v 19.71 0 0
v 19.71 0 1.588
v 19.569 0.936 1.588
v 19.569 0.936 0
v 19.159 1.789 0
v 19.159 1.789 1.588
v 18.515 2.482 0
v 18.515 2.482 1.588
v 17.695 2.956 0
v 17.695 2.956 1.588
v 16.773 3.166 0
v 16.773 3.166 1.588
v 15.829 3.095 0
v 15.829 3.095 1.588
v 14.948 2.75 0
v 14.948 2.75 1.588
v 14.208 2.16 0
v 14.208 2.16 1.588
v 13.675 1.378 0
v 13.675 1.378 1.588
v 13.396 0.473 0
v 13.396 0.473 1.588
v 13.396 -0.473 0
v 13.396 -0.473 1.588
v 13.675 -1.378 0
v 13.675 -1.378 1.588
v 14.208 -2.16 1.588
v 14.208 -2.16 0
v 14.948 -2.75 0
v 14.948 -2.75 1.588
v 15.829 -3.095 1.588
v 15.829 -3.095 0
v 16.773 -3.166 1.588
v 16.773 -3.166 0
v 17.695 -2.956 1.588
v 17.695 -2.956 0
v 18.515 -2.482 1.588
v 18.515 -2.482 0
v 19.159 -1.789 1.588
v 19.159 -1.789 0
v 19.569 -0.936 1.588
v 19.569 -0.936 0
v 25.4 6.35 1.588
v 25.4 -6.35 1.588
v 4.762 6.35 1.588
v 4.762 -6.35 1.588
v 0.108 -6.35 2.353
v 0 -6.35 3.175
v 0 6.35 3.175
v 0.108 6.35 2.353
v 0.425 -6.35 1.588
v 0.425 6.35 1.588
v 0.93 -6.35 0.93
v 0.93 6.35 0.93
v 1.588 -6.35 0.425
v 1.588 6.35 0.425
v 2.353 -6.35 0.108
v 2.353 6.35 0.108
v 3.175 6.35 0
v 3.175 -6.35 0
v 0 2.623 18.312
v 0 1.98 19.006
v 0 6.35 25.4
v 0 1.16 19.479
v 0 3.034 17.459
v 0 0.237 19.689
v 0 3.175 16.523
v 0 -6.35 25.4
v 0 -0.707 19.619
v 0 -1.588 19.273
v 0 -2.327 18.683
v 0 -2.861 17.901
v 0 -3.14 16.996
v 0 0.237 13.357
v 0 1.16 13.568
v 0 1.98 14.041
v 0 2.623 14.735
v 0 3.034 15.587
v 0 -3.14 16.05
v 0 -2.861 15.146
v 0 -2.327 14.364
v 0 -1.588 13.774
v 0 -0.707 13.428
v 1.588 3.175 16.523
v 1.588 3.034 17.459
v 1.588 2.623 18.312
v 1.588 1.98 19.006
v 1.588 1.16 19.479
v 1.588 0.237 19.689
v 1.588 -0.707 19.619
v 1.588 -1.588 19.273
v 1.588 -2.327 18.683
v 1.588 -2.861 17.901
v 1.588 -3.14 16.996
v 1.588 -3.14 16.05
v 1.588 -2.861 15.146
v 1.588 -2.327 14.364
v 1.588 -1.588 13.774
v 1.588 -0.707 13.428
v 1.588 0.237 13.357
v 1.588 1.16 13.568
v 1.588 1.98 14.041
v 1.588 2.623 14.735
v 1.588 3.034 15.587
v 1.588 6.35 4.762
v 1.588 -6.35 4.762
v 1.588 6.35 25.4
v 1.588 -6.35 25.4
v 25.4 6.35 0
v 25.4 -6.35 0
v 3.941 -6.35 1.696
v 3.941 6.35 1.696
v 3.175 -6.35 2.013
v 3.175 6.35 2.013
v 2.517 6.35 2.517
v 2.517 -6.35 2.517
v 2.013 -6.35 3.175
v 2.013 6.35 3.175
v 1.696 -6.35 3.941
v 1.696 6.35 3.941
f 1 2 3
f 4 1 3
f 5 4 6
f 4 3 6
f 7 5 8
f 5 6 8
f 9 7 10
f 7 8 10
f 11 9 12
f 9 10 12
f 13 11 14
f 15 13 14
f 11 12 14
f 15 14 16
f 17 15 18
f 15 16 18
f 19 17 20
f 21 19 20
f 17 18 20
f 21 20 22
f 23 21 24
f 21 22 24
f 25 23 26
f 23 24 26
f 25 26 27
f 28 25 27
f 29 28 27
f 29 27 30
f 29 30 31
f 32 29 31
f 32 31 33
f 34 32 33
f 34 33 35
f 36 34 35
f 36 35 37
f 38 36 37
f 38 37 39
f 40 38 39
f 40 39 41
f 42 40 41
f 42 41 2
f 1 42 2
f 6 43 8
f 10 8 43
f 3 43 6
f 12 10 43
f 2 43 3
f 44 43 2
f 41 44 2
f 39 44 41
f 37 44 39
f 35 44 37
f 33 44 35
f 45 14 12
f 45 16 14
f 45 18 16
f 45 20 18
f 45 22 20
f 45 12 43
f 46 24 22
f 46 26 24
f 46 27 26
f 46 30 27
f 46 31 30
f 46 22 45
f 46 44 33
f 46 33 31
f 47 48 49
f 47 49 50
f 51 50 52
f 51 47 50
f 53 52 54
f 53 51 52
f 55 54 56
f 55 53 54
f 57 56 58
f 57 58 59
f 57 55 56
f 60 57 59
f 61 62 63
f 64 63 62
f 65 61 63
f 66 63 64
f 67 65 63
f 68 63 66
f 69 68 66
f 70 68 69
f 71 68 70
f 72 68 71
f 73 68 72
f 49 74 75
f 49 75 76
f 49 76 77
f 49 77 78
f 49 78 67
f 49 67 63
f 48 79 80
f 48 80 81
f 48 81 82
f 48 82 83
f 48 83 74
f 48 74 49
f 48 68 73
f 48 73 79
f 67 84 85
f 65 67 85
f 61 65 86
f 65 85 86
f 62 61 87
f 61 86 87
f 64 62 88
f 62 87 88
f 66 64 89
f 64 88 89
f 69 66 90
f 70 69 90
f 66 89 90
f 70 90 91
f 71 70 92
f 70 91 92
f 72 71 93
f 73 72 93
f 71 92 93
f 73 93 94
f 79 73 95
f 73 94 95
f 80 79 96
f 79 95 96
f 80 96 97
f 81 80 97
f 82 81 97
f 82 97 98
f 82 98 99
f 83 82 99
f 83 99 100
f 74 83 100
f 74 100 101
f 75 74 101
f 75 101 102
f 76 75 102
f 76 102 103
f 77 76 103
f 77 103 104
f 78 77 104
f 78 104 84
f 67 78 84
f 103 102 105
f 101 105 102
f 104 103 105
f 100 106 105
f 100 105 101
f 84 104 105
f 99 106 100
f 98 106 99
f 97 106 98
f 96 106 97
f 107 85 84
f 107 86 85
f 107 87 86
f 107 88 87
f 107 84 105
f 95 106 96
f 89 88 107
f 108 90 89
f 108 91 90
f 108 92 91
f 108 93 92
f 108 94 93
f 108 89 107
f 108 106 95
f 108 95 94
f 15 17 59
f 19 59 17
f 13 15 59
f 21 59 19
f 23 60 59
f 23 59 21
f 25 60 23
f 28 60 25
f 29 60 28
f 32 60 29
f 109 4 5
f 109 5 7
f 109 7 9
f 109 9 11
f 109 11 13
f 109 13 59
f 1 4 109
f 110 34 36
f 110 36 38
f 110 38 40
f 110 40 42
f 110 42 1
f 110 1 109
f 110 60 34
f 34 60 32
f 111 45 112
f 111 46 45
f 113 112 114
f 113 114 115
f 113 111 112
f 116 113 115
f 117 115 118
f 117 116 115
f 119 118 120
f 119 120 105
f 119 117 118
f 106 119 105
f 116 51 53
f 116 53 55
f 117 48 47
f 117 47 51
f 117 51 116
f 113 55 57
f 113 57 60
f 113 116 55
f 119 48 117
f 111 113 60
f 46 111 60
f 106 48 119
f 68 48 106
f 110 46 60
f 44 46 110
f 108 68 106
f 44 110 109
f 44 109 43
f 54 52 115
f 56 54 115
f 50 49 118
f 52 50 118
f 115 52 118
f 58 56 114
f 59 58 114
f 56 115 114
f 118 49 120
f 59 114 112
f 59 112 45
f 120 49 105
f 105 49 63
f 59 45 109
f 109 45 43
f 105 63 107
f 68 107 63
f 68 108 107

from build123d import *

# Parameters (mm, degrees)
F1_DEPTH = 6.35
F2_R     = 3.175
F3_DEPTH = 1.5885
F4_R     = 3.175
F5_DEPTH = 1.5885


with BuildPart() as f1:
    # F0 (on Front) → F1 (new body, symmetric)
    with BuildSketch(Plane.XZ):
        with BuildLine():
            Line((1.5875, 25.4), (0, 25.4))
            Line((0, 25.4), (0, 3.175))
            ThreePointArc((0, 3.175), (0.929936, 0.929936), (3.175, 0))
            Line((3.175, 0), (25.4, 0))
            Line((25.4, 0), (25.4, 1.5875))
            Line((25.4, 1.5875), (4.7625, 1.5875))
            ThreePointArc((4.7625, 1.5875), (2.517436, 2.517436), (1.5875, 4.7625))
            Line((1.5875, 4.7625), (1.5875, 25.4))
        make_face()
    extrude(amount=F1_DEPTH, both=True)

    # F2 (on face) → F3 (cut, through all)
    with BuildSketch(Plane.YZ.offset(1.5875)):
        with Locations((0, 16.523208)):
            Circle(F2_R)
    extrude(amount=-F3_DEPTH, mode=Mode.SUBTRACT)

    # F4 (on face) → F5 (cut, through all)
    with BuildSketch(Plane.XY.offset(1.5875)):
        with Locations((16.5354, 0)):
            Circle(F4_R)
    extrude(amount=-F5_DEPTH, mode=Mode.SUBTRACT)


solid = f1.part
